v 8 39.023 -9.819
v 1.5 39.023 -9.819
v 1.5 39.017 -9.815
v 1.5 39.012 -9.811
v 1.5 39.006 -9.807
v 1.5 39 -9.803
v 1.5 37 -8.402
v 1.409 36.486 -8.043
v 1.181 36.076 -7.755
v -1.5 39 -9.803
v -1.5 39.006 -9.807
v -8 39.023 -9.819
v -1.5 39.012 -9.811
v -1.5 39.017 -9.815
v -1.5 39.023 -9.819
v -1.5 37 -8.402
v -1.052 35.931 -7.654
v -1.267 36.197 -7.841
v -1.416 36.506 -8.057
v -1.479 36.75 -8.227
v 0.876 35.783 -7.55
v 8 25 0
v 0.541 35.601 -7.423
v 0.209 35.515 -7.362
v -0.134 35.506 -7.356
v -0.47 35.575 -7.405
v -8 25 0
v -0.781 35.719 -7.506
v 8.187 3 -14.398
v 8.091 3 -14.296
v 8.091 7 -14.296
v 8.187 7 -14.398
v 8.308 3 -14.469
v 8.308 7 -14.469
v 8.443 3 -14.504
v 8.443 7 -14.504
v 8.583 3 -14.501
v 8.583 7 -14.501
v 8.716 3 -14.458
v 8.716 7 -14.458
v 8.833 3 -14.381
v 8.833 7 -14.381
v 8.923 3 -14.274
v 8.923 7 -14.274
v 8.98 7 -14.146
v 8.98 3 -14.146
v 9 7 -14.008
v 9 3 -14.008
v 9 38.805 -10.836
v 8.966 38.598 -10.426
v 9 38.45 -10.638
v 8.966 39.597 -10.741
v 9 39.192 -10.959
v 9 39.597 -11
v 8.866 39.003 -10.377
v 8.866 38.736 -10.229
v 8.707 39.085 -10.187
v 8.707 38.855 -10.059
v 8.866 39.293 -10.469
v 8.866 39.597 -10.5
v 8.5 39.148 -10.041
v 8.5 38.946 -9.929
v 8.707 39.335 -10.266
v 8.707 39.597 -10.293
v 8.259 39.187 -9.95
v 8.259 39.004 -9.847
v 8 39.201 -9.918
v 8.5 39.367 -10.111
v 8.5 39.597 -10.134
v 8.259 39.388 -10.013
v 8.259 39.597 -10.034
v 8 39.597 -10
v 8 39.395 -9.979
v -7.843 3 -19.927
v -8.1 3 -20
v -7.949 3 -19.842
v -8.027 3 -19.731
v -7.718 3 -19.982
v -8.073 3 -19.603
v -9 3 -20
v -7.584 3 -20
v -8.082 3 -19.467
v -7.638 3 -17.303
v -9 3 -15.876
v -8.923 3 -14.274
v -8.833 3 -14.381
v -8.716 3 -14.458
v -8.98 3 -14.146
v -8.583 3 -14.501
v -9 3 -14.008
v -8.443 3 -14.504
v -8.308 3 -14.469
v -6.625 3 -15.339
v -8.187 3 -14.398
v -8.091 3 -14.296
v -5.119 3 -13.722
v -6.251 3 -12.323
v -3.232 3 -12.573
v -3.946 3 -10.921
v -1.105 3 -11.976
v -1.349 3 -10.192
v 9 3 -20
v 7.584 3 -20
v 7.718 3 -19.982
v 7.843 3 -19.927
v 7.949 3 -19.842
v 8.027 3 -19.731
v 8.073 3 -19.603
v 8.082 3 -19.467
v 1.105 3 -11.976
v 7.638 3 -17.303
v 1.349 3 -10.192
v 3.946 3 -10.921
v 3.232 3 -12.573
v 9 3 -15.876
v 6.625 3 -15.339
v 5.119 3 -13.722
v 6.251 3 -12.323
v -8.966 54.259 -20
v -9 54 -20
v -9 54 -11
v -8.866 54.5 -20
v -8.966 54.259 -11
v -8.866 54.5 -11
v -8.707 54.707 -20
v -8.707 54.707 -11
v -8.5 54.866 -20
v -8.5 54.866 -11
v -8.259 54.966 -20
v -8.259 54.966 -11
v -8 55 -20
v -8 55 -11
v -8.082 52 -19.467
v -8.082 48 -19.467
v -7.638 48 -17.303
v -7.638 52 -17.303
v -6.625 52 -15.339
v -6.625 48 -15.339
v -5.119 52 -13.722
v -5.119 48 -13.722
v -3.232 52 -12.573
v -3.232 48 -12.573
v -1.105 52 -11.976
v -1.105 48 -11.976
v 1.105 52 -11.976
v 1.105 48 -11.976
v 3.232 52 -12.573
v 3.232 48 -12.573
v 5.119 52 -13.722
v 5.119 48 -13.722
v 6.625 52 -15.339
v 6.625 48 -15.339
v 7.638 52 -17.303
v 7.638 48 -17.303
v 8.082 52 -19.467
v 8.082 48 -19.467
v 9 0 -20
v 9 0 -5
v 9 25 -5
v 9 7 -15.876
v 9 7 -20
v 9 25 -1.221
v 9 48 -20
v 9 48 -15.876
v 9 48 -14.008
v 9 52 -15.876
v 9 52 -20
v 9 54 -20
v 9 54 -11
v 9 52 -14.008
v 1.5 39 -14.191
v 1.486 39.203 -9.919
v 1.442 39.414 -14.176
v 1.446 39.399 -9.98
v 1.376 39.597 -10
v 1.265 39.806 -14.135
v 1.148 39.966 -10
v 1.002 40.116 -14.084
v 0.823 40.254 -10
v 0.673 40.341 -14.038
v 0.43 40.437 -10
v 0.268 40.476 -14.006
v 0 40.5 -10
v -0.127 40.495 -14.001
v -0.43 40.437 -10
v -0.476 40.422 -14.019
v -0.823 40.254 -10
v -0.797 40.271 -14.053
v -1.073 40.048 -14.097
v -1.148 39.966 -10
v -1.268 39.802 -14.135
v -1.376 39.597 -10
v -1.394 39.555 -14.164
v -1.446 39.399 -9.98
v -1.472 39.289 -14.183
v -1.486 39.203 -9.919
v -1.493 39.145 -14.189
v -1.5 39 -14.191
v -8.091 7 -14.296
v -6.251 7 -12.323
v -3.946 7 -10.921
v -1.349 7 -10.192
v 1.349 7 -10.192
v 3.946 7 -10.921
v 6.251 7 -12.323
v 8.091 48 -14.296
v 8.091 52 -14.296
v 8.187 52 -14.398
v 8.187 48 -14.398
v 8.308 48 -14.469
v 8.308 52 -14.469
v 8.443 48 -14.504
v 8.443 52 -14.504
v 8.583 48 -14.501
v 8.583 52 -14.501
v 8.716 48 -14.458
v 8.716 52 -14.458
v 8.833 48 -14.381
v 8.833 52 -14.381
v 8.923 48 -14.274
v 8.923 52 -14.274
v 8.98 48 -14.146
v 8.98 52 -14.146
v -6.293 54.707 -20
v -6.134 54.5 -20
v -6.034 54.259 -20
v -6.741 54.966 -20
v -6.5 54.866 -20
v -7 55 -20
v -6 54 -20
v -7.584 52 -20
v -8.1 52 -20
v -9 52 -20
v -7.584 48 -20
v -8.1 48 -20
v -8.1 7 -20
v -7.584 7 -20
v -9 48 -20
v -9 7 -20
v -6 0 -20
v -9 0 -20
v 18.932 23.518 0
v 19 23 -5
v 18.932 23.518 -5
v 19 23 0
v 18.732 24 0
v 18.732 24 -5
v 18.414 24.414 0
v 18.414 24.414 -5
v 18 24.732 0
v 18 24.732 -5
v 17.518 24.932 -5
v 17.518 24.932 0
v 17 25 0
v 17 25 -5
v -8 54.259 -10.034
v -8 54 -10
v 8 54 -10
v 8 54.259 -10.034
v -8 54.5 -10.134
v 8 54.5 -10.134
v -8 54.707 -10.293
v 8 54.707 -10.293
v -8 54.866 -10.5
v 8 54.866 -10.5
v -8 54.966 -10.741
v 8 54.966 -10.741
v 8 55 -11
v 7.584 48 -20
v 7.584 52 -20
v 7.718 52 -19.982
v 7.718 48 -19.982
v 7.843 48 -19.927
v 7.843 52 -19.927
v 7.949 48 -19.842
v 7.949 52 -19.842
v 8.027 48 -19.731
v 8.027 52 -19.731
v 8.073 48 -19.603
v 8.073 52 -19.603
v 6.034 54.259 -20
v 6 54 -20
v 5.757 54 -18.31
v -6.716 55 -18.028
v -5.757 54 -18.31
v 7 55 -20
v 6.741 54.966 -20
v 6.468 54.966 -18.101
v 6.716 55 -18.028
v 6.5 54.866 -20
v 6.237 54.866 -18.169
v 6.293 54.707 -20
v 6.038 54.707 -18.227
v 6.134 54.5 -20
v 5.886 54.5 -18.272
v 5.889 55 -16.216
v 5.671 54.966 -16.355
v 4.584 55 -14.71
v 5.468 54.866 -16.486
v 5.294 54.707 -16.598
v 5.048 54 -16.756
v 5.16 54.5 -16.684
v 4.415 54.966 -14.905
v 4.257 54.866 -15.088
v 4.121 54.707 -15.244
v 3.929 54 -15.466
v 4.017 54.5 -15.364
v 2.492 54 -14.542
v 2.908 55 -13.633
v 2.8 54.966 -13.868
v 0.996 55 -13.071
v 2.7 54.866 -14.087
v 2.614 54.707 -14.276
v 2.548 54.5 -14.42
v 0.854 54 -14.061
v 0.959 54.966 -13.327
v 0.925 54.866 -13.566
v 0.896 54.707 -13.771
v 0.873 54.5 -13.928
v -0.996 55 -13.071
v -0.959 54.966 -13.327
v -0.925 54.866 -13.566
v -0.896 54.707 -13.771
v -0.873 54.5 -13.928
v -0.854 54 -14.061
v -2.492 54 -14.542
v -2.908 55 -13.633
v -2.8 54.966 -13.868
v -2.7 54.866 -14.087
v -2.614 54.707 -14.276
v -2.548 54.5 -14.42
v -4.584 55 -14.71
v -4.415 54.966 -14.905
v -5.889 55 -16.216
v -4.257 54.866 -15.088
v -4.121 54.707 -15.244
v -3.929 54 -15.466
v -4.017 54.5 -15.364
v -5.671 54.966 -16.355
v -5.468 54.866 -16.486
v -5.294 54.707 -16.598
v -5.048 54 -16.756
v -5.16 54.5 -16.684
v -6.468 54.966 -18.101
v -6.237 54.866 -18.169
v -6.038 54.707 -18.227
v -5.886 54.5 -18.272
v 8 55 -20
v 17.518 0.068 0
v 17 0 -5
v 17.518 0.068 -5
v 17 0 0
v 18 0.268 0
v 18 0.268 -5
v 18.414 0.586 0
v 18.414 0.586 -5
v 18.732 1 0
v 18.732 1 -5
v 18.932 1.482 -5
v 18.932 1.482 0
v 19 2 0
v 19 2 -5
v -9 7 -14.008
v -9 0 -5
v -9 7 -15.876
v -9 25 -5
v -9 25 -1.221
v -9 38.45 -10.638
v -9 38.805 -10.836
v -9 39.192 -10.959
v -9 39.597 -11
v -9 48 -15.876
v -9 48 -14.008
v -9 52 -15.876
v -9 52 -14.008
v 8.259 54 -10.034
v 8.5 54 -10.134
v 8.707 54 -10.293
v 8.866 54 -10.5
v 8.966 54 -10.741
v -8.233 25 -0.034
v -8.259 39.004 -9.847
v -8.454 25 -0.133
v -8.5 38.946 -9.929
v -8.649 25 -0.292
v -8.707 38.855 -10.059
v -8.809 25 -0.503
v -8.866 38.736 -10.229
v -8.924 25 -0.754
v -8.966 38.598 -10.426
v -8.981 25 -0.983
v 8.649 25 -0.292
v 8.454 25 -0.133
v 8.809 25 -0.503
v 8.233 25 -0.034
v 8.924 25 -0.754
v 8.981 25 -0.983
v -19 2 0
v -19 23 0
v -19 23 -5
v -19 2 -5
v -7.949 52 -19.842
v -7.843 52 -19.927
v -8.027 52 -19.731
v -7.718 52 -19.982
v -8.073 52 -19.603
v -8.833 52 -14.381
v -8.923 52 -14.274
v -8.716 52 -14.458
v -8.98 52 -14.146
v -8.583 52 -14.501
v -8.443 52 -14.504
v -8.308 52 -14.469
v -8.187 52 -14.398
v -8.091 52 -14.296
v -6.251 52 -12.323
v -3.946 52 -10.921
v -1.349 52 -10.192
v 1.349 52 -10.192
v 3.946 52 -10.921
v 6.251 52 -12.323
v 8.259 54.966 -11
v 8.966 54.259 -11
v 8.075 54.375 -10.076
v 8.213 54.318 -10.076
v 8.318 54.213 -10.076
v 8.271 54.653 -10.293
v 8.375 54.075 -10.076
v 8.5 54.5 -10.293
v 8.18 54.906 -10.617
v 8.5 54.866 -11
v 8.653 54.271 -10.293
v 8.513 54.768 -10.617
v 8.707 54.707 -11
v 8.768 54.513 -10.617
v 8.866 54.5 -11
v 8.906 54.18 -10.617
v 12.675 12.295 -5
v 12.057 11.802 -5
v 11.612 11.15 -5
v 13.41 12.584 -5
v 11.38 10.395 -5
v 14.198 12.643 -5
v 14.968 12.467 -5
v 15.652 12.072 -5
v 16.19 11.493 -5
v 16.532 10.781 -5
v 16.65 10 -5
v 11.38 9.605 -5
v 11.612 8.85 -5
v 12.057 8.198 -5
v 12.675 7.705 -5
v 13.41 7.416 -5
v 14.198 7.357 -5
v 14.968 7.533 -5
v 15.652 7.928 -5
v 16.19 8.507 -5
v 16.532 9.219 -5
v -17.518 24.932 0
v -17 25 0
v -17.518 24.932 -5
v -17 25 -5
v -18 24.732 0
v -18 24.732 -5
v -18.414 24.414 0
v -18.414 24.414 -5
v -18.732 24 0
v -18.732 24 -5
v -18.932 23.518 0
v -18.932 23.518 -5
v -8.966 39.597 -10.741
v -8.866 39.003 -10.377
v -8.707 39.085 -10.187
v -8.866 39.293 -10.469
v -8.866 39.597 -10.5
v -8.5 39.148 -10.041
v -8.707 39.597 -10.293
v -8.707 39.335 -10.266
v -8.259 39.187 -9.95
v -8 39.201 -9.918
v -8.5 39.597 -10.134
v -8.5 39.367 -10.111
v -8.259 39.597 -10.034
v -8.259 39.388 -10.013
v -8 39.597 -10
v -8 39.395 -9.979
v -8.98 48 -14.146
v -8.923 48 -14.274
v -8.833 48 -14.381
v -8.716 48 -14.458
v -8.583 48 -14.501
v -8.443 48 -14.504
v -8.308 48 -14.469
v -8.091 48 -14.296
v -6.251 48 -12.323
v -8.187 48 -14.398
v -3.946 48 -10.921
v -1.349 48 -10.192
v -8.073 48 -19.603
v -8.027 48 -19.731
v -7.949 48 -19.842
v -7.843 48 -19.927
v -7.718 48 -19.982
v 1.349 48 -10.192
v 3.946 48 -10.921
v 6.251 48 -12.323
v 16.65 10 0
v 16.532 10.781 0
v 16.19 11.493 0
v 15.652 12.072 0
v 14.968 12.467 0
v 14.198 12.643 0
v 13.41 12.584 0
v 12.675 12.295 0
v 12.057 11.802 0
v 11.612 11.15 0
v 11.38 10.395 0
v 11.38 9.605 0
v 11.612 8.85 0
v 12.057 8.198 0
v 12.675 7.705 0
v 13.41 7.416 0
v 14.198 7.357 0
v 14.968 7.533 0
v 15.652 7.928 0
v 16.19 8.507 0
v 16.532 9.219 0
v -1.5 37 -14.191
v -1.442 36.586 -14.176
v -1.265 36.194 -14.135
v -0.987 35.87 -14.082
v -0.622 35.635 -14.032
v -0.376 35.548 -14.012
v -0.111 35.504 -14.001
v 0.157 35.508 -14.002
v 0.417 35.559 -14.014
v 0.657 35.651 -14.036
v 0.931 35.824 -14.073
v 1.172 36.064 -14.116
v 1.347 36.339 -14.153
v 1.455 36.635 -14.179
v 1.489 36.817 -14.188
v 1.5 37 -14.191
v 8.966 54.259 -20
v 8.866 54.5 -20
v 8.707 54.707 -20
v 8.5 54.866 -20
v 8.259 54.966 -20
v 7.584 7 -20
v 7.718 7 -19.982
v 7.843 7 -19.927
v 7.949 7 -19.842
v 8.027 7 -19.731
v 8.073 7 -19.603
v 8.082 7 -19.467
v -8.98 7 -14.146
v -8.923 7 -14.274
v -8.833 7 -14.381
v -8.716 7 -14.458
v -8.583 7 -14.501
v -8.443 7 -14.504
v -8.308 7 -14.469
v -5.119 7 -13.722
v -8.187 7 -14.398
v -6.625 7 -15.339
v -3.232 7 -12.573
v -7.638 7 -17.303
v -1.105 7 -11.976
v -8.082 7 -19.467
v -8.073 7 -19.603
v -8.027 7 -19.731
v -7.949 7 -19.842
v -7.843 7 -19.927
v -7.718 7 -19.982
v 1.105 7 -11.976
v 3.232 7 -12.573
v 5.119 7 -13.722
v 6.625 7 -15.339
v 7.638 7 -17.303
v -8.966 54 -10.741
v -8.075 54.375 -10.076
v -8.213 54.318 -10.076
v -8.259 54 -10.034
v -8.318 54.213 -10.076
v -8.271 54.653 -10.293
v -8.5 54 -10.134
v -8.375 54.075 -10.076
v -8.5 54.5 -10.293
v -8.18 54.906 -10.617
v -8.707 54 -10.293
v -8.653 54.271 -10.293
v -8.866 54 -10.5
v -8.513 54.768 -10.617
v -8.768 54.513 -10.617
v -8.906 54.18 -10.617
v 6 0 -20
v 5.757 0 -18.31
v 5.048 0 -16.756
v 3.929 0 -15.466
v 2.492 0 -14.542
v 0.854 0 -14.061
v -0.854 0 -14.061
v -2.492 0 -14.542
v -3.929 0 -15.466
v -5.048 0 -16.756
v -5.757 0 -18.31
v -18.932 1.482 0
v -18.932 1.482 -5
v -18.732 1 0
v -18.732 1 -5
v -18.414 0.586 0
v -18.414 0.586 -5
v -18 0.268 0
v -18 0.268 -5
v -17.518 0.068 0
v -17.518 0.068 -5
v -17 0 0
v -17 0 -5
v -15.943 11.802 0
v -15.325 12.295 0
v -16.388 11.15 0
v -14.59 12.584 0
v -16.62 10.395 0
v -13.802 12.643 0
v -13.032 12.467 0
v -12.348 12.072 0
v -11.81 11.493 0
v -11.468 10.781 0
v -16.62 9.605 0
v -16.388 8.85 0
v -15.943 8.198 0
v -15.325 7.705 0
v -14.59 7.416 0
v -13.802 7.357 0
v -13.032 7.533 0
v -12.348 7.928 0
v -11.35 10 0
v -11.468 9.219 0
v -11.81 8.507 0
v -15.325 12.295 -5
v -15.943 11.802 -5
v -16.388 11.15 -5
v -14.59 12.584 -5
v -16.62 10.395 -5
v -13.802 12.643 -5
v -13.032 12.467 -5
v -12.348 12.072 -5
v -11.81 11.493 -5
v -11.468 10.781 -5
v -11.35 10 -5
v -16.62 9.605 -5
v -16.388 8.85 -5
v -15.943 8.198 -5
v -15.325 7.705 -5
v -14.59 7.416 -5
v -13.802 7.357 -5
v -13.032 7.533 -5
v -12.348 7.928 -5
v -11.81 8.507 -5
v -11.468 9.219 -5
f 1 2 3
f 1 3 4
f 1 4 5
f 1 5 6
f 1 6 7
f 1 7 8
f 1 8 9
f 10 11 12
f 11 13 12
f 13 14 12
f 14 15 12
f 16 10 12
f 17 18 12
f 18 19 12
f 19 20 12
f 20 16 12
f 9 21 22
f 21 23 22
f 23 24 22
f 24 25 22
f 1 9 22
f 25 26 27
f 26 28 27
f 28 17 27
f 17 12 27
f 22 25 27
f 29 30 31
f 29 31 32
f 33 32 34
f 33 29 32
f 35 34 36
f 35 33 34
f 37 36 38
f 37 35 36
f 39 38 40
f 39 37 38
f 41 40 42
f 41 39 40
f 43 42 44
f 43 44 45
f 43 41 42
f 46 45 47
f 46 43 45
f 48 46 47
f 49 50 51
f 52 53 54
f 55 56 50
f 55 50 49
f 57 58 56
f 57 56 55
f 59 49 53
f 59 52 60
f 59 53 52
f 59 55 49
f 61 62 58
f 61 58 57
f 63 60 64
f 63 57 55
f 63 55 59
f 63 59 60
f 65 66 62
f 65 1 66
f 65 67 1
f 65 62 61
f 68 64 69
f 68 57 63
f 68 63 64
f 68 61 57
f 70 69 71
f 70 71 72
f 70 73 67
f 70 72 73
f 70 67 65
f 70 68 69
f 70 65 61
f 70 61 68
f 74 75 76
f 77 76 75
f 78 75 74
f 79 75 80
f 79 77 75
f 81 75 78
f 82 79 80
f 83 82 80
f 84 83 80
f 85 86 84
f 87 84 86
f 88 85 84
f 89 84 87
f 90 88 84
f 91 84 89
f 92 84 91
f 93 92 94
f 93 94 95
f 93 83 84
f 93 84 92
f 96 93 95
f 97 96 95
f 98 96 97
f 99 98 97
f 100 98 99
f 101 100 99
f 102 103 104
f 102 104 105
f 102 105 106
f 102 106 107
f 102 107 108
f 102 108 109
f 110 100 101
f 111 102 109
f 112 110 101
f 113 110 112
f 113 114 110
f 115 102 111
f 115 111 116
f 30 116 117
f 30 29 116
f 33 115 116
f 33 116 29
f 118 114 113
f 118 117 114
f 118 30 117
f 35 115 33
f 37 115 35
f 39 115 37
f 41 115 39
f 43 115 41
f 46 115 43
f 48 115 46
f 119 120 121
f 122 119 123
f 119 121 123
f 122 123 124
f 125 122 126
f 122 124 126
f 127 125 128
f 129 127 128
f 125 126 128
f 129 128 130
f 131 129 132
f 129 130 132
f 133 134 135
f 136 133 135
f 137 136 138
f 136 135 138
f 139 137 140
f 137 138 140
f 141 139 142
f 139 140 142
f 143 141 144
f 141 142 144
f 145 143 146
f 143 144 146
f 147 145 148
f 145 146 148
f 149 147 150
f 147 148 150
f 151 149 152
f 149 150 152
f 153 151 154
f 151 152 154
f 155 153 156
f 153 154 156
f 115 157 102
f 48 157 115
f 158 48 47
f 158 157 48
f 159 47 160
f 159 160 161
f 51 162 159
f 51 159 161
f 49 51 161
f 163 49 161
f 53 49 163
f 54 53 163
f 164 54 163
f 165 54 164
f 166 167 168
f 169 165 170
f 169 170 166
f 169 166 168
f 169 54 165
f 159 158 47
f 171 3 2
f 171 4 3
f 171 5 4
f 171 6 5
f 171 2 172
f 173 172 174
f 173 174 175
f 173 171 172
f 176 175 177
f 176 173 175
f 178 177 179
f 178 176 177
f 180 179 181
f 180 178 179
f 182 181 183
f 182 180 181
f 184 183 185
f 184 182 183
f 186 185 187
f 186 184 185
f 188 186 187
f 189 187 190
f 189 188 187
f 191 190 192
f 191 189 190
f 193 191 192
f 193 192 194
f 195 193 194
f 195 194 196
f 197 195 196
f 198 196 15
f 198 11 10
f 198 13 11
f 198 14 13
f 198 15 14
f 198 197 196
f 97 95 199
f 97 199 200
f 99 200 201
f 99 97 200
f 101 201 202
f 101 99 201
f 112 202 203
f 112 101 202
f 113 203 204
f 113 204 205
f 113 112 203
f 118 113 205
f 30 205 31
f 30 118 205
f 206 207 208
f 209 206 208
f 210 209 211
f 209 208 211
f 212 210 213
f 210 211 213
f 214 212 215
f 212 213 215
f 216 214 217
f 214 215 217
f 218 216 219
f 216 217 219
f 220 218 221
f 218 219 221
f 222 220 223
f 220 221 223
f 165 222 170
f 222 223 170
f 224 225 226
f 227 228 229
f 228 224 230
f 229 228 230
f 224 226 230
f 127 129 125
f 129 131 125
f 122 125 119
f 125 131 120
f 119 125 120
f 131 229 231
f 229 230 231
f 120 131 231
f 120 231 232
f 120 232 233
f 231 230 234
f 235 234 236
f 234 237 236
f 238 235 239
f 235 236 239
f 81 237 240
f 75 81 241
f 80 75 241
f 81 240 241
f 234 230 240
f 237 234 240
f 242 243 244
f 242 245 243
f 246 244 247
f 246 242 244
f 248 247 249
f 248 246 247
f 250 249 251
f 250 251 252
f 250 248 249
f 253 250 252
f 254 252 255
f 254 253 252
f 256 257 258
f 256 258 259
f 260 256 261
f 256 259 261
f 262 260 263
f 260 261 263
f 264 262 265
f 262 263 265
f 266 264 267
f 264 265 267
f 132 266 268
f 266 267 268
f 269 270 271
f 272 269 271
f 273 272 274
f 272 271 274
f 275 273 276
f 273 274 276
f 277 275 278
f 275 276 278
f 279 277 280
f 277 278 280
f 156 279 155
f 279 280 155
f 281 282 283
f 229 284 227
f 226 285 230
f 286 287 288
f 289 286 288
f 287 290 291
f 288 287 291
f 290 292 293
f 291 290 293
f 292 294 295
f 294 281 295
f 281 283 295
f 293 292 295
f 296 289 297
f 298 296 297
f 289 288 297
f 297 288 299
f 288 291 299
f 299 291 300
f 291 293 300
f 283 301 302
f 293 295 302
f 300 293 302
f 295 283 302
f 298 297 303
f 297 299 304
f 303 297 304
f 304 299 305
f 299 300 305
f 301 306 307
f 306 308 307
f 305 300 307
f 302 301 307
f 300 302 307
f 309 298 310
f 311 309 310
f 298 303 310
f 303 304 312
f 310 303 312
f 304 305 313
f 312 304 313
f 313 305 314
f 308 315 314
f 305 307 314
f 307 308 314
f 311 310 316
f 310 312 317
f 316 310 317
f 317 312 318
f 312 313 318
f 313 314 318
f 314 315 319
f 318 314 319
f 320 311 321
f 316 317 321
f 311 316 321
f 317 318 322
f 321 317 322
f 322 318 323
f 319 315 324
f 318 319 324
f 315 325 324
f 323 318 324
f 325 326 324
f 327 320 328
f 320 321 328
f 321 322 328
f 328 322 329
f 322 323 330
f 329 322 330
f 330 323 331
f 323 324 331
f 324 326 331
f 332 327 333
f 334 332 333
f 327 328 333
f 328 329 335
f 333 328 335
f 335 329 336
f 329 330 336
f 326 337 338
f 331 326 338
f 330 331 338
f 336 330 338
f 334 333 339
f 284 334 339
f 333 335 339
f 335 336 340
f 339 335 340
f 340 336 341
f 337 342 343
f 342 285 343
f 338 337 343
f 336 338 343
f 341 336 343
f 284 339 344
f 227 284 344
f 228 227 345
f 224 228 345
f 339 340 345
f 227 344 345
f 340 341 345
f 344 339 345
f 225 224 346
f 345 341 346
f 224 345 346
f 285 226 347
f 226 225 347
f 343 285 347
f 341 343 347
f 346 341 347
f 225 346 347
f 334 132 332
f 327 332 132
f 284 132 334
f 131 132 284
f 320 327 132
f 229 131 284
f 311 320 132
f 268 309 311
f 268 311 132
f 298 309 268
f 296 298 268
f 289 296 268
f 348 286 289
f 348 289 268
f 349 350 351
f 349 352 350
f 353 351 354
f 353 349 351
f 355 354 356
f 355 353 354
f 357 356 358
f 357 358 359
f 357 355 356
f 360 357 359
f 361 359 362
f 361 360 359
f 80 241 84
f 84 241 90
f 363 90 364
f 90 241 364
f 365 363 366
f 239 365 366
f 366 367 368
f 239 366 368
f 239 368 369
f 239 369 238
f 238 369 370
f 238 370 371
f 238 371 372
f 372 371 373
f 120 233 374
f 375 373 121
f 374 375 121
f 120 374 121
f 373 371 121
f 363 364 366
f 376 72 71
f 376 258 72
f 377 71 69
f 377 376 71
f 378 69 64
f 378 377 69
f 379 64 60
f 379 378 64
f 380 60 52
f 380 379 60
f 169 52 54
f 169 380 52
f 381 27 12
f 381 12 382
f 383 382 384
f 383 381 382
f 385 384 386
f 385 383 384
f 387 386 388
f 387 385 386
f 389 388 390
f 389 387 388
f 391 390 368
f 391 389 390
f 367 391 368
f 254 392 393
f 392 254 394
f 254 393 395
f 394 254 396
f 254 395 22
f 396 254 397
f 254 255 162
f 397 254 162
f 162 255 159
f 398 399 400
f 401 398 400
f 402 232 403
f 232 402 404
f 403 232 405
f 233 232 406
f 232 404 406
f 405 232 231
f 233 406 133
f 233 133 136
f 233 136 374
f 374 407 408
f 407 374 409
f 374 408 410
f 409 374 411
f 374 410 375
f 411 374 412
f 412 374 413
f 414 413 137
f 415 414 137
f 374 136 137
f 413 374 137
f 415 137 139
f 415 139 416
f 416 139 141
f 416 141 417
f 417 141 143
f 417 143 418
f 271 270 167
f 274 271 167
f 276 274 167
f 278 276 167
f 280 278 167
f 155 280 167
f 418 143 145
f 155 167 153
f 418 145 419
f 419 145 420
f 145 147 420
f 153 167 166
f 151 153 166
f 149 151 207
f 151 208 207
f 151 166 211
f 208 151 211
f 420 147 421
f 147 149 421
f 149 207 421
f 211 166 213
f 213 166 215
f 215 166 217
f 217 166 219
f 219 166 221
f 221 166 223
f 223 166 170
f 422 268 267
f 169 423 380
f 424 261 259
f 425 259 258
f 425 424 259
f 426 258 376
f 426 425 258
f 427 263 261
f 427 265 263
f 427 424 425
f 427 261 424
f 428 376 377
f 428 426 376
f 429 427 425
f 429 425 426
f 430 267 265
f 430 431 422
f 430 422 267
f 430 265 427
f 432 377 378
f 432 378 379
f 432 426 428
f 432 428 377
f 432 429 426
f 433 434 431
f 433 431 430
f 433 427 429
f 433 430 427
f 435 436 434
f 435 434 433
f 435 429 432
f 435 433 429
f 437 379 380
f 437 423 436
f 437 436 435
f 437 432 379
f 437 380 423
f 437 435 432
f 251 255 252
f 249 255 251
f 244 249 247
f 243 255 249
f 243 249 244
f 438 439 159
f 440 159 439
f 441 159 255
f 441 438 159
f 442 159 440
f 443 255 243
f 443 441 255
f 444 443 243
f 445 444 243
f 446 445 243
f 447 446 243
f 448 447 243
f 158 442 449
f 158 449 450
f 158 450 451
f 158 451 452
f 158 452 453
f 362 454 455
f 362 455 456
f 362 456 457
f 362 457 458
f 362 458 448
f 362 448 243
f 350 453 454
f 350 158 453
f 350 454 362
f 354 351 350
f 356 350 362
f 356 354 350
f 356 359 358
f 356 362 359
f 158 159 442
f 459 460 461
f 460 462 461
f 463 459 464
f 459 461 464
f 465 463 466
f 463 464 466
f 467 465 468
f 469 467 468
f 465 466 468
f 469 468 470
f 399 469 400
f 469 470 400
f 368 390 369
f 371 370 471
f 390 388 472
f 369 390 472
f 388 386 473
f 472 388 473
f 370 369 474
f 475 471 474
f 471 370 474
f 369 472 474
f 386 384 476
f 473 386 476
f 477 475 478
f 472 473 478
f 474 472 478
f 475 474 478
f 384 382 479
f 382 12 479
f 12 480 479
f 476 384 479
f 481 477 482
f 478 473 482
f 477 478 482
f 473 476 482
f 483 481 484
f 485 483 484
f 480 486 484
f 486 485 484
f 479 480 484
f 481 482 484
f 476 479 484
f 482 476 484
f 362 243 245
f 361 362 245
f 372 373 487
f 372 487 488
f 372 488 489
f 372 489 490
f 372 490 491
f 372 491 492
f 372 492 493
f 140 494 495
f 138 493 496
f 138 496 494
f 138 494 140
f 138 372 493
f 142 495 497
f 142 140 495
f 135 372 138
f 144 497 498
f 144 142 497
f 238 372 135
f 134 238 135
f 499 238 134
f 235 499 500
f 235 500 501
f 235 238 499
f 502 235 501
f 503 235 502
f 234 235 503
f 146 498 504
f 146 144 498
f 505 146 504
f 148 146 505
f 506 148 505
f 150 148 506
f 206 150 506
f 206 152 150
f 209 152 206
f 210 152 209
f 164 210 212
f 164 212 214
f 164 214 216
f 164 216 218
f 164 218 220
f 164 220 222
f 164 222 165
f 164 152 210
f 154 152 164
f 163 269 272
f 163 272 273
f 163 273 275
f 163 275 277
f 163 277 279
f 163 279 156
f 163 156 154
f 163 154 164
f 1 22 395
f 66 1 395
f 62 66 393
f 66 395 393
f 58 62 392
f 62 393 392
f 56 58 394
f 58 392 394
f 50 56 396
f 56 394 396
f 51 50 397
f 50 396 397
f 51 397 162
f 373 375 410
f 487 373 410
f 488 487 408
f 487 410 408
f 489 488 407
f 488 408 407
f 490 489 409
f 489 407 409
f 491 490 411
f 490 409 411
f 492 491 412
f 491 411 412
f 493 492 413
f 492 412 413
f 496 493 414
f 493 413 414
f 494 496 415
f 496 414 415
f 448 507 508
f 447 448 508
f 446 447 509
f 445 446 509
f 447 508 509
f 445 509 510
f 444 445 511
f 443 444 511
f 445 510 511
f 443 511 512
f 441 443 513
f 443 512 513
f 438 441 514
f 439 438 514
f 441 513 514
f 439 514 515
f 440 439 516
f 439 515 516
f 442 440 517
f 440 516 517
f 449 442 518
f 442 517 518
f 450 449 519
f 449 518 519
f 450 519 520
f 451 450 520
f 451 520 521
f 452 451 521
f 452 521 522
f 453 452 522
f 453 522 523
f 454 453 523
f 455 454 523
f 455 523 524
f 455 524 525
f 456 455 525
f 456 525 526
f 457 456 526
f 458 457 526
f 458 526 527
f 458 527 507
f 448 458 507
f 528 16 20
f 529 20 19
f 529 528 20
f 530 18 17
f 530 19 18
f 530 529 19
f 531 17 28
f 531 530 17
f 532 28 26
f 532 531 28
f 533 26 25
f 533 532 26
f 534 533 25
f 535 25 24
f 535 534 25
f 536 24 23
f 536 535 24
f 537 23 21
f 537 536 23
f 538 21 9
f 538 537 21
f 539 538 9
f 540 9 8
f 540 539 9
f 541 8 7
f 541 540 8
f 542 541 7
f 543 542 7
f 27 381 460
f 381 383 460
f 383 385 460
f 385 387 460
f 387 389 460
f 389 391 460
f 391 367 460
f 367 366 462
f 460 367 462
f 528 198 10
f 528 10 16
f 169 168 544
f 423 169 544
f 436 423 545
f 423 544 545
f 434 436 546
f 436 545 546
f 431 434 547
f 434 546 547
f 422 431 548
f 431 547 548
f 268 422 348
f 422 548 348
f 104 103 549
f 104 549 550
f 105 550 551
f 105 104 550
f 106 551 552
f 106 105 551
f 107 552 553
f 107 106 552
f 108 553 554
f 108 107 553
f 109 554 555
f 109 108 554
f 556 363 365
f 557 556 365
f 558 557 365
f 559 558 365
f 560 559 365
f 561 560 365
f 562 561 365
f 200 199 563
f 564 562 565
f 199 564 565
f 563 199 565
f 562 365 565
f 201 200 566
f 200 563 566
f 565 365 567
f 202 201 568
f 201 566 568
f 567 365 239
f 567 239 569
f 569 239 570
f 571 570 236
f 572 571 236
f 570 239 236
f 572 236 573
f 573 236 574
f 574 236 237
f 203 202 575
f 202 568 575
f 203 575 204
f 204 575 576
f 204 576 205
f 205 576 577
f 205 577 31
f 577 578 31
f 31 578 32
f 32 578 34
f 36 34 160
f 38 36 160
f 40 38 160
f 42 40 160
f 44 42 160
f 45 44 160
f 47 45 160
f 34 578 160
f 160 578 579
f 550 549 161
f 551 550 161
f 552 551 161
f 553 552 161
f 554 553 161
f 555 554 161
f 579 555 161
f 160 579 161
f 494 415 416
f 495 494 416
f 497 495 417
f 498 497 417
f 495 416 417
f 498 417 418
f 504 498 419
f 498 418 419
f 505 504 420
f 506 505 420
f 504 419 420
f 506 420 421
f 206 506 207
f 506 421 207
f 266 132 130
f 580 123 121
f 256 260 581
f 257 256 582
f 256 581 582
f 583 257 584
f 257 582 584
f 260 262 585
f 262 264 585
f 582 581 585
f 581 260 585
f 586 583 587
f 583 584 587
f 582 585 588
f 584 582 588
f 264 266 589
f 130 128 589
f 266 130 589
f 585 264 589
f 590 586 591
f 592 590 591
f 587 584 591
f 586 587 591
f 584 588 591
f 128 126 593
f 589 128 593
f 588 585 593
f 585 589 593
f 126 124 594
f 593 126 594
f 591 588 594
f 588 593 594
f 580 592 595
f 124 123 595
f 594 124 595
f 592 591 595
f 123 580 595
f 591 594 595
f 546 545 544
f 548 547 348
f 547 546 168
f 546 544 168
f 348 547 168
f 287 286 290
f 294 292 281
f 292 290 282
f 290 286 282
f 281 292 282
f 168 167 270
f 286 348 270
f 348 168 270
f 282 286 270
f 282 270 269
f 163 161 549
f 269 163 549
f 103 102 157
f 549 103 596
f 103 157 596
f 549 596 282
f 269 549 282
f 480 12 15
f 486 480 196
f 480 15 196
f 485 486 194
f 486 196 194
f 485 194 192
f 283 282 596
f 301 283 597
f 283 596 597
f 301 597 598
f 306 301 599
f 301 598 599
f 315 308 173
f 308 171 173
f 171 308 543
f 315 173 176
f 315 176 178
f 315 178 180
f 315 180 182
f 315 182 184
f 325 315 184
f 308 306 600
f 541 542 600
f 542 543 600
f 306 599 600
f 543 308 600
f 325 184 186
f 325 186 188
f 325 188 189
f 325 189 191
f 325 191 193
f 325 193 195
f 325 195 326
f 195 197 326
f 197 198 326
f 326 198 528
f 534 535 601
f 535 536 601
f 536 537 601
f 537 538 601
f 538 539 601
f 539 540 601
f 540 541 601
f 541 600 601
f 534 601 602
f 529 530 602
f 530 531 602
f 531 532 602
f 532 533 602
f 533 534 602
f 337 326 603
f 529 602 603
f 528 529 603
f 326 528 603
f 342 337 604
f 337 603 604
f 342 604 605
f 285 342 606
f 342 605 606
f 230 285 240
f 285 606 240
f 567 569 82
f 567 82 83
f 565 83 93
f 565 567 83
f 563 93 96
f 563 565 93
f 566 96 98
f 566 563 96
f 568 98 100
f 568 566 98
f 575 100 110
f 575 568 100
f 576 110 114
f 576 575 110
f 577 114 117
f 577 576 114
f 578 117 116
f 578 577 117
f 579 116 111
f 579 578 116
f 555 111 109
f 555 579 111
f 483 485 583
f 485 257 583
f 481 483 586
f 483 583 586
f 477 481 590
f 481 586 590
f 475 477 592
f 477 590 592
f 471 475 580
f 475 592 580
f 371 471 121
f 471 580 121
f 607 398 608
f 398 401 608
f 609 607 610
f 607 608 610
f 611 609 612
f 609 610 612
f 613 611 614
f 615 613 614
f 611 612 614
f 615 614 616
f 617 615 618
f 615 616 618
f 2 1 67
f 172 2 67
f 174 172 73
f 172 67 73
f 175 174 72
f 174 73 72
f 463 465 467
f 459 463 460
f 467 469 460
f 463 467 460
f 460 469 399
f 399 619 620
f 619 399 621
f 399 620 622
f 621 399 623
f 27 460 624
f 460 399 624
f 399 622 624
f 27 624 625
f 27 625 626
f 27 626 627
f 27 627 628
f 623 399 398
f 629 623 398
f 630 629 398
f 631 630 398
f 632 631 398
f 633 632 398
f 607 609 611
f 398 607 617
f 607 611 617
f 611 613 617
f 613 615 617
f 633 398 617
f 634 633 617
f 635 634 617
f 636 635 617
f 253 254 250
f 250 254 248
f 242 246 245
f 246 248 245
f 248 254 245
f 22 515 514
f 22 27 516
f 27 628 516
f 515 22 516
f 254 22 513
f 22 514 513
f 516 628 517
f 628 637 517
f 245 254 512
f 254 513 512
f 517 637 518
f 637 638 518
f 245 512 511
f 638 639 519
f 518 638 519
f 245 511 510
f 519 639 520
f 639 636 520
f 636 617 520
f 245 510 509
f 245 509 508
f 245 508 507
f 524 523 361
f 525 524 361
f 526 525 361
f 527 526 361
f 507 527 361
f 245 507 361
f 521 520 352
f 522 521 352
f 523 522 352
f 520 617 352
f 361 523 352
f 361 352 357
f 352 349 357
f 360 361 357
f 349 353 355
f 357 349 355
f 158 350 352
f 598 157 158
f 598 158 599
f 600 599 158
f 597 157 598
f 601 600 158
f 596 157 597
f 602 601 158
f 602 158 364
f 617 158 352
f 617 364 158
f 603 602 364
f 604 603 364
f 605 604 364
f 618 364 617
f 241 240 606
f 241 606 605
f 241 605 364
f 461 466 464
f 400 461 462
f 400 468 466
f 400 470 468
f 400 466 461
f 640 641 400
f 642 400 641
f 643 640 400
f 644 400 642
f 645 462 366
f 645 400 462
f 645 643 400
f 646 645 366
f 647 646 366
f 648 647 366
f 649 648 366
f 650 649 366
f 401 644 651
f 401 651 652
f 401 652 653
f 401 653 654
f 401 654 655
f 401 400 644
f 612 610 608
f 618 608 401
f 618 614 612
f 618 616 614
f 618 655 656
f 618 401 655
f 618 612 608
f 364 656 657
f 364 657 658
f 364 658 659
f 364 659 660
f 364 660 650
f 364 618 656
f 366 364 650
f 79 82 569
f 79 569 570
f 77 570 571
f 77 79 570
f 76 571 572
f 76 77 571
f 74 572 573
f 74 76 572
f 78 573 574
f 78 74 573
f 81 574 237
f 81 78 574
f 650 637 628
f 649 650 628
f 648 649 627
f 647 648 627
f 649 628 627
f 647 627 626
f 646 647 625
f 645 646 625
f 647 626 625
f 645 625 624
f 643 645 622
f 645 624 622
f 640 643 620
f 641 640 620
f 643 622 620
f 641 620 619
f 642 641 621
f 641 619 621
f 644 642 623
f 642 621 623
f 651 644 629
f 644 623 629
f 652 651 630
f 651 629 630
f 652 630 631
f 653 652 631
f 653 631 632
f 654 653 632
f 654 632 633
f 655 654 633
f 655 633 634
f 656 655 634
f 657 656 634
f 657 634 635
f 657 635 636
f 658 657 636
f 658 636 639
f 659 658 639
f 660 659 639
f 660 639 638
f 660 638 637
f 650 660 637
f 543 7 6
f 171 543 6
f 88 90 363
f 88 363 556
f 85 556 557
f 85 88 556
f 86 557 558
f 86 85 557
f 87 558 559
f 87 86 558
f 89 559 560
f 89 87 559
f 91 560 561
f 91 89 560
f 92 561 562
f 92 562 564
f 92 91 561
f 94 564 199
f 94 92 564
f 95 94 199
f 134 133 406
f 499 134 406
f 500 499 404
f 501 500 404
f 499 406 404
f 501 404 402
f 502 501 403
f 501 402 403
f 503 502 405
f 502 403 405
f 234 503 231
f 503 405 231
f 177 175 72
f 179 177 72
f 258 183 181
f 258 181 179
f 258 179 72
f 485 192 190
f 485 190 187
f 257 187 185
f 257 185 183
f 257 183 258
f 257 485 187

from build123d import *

# Parameters (mm, degrees)
BOSS_EXTRUDE1_DEPTH  = 20
M5_CLEARANCE_HOLE1_D = 5.3
SKETCH11_W           = 1.8
SKETCH11_H           = 4
FILLET2_START        = 3
FILLET2_DEPTH        = 4
MOVE_FACE1_BY        = 5
BOSS_EXTRUDE2_DEPTH  = 30
FILLET1_R            = 2
SKETCH13_W           = 10
SKETCH13_H           = 30
CUT_EXTRUDE1_DEPTH   = 65.876806449
CHAMFER3_SIZE        = 14.281480067
CHAMFER3_SIZE_2      = 10
FILLET3_R            = 1
CUT_EXTRUDE2_DEPTH   = 62.530480341


with BuildPart() as part:
    # Sketch4 → Boss-Extrude1 (new body)
    with BuildSketch(Plane(origin=(0, 0, 0), x_dir=(1, 0, 0), z_dir=(0, 1, 0))):
        with BuildLine():
            Line((19, 0), (-19, 0))
            Line((-19, 0), (-19, 5))
            Line((-19, 5), (-9, 5))
            Line((-9, 5), (-9, 20))
            Line((-9, 20), (-6, 20))
            ThreePointArc((-6, 20), (0, 14), (6, 20))
            Line((6, 20), (9, 20))
            Line((9, 20), (9, 5))
            Line((9, 5), (19, 5))
            Line((19, 5), (19, 0))
        make_face()
    extrude(amount=BOSS_EXTRUDE1_DEPTH)

    # M5 Clearance Hole1 (through all)
    with Locations(Plane(origin=(0, 0, -5), x_dir=(-1, 0, 0), z_dir=(0, 0, -1))):
        with Locations((-14, 10), (14, 10)):
            Hole(M5_CLEARANCE_HOLE1_D / 2)

    # Cut-Sweep1: sweep along a path in Sketch10
    with BuildLine(Plane(origin=(0, 5, 0), x_dir=(1, 0, 0), z_dir=(0, 1, 0))) as cut_sweep1_path:
        CenterArc((0, 20), 6, 0, 360)
    # Sketch11 → Cut-Sweep1 (sweep, cut)
    with BuildSketch(Plane(origin=(0, 0, -20), x_dir=(-1, 0, 0), z_dir=(0, 0, -1))):
        with Locations((-9, 5)):
            Rectangle(SKETCH11_W, SKETCH11_H)
    cut_sweep1 = sweep(path=cut_sweep1_path.line, mode=Mode.SUBTRACT)

    # Fillet2: read off the stored shape, not the designer's step
    # Fillet2 outline → Fillet2 (cut)
    with BuildSketch(Plane(origin=(0, 0, 0), x_dir=(1, 0, 0), z_dir=(0, 1, 0)).offset(FILLET2_START)):
        with BuildLine():
            ThreePointArc((7.583534796, 20), (7.948532993, 19.841725498), (8.082451559, 19.467105263))
            ThreePointArc((8.082451559, 19.467105263), (8.095611701, 19.733408201), (8.1, 20))
            Line((8.1, 20), (7.583534796, 20))
        make_face()
        with BuildLine():
            ThreePointArc((-8.1, 20), (-8.095611701, 19.733408201), (-8.082451559, 19.467105263))
            ThreePointArc((-8.082451559, 19.467105263), (-7.948532993, 19.841725498), (-7.583534796, 20))
            Line((-7.583534796, 20), (-8.1, 20))
        make_face()
        with BuildLine():
            Line((9, 14.007504693), (9, 15.875681875))
            ThreePointArc((9, 15.875681875), (8.582114467, 15.064687318), (8.091346154, 14.295605429))
            ThreePointArc((8.091346154, 14.295605429), (8.651117631, 14.484121375), (9, 14.007504693))
        make_face()
        with BuildLine():
            ThreePointArc((-8.091346154, 14.295605429), (-8.582114467, 15.064687318), (-9, 15.875681875))
            Line((-9, 15.875681875), (-9, 14.007504693))
            ThreePointArc((-9, 14.007504693), (-8.651117631, 14.484121375), (-8.091346154, 14.295605429))
        make_face()
    fillet2 = extrude(amount=FILLET2_DEPTH, mode=Mode.SUBTRACT)

    # Move Face1: a face moved outward by 5.0
    extrude(part.faces().sort_by_distance((0, 20, -7.09633707))[0], amount=MOVE_FACE1_BY, dir=(0, 1, 0))

    # Sketch12 → Boss-Extrude2 (add)
    with BuildSketch(Plane(origin=(0, 25, 0), x_dir=(1, 0, 0), z_dir=(0, 1, 0))):
        with BuildLine():
            Line((-9, 5), (-9, 0))
            Line((-9, 0), (9, 0))
            Line((9, 0), (9, 5))
            Line((9, 5), (9, 20))
            Line((9, 20), (6, 20))
            ThreePointArc((6, 20), (0, 14), (-6, 20))
            Line((-6, 20), (-9, 20))
            Line((-9, 20), (-9, 5))
        make_face()
    extrude(amount=BOSS_EXTRUDE2_DEPTH)

    # Fillet1
    fillet1_edges = [part.edges().sort_by_distance(p)[0] for p in [
        (19, 25, -2.5),
        (19, 0, -2.5),
        (-19, 0, -2.5),
        (-19, 25, -2.5),
    ]]
    fillet(fillet1_edges, radius=FILLET1_R)

    # Sketch13 → Cut-Extrude1 (cut, through all)
    with BuildSketch(Plane.ZY.offset(9)):
        with Locations((-5, 40)):
            Rectangle(SKETCH13_W, SKETCH13_H)
    extrude(amount=-CUT_EXTRUDE1_DEPTH, mode=Mode.SUBTRACT)

    # Chamfer3
    # the kernel refuses this chamfer: 14.281480067, 10 mm, written as the material it adds along each edge
    with BuildSketch(Plane(origin=(-9, 25, -10), x_dir=(0, 1, 0), z_dir=(1, 0, 0))) as chamfer3_piece_1_section:
        Polygon((CHAMFER3_SIZE, 0), (0, CHAMFER3_SIZE_2), (0, 0), align=None)
    chamfer3_piece_1 = extrude(amount=18, mode=Mode.PRIVATE)
    chamfer3_piece_1 = split(chamfer3_piece_1, bisect_by=Plane(origin=(-9, 25, 0), z_dir=(0, 0, -1)), keep=Keep.TOP, mode=Mode.PRIVATE)
    add(chamfer3_piece_1)

    # Fillet3
    fillet3_edges = [part.edges().sort_by_distance(p)[0] for p in [
        (0, 55, -14),
        (-9, 55, -15),
        (9, 55, -15),
        (0, 55, -10),
        (9, 47.140740034, -10),
        (-9, 47.140740034, -10),
        (0, 39.281480067, -10),
        (-9, 32.140740034, -5),
        (9, 32.140740034, -5),
    ]]
    fillet(fillet3_edges, radius=FILLET3_R)

    # Mirror1: Cut-Sweep1, Fillet2 across plane
    add(cut_sweep1.mirror(Plane.ZX.offset(27.5)), mode=Mode.SUBTRACT)
    add(fillet2.mirror(Plane.ZX.offset(27.5)), mode=Mode.SUBTRACT)

    # Sketch14 → Cut-Extrude2 (cut, through all)
    with BuildSketch(Plane(origin=(0, 0, -20), x_dir=(-1, 0, 0), z_dir=(0, 0, -1))):
        with BuildLine():
            Line((-1.5, 37), (-1.5, 39))
            ThreePointArc((-1.5, 39), (0, 40.5), (1.5, 39))
            Line((1.5, 39), (1.5, 37))
            ThreePointArc((1.5, 37), (0, 35.5), (-1.5, 37))
        make_face()
    extrude(amount=-CUT_EXTRUDE2_DEPTH, mode=Mode.SUBTRACT)


solid = part.part
